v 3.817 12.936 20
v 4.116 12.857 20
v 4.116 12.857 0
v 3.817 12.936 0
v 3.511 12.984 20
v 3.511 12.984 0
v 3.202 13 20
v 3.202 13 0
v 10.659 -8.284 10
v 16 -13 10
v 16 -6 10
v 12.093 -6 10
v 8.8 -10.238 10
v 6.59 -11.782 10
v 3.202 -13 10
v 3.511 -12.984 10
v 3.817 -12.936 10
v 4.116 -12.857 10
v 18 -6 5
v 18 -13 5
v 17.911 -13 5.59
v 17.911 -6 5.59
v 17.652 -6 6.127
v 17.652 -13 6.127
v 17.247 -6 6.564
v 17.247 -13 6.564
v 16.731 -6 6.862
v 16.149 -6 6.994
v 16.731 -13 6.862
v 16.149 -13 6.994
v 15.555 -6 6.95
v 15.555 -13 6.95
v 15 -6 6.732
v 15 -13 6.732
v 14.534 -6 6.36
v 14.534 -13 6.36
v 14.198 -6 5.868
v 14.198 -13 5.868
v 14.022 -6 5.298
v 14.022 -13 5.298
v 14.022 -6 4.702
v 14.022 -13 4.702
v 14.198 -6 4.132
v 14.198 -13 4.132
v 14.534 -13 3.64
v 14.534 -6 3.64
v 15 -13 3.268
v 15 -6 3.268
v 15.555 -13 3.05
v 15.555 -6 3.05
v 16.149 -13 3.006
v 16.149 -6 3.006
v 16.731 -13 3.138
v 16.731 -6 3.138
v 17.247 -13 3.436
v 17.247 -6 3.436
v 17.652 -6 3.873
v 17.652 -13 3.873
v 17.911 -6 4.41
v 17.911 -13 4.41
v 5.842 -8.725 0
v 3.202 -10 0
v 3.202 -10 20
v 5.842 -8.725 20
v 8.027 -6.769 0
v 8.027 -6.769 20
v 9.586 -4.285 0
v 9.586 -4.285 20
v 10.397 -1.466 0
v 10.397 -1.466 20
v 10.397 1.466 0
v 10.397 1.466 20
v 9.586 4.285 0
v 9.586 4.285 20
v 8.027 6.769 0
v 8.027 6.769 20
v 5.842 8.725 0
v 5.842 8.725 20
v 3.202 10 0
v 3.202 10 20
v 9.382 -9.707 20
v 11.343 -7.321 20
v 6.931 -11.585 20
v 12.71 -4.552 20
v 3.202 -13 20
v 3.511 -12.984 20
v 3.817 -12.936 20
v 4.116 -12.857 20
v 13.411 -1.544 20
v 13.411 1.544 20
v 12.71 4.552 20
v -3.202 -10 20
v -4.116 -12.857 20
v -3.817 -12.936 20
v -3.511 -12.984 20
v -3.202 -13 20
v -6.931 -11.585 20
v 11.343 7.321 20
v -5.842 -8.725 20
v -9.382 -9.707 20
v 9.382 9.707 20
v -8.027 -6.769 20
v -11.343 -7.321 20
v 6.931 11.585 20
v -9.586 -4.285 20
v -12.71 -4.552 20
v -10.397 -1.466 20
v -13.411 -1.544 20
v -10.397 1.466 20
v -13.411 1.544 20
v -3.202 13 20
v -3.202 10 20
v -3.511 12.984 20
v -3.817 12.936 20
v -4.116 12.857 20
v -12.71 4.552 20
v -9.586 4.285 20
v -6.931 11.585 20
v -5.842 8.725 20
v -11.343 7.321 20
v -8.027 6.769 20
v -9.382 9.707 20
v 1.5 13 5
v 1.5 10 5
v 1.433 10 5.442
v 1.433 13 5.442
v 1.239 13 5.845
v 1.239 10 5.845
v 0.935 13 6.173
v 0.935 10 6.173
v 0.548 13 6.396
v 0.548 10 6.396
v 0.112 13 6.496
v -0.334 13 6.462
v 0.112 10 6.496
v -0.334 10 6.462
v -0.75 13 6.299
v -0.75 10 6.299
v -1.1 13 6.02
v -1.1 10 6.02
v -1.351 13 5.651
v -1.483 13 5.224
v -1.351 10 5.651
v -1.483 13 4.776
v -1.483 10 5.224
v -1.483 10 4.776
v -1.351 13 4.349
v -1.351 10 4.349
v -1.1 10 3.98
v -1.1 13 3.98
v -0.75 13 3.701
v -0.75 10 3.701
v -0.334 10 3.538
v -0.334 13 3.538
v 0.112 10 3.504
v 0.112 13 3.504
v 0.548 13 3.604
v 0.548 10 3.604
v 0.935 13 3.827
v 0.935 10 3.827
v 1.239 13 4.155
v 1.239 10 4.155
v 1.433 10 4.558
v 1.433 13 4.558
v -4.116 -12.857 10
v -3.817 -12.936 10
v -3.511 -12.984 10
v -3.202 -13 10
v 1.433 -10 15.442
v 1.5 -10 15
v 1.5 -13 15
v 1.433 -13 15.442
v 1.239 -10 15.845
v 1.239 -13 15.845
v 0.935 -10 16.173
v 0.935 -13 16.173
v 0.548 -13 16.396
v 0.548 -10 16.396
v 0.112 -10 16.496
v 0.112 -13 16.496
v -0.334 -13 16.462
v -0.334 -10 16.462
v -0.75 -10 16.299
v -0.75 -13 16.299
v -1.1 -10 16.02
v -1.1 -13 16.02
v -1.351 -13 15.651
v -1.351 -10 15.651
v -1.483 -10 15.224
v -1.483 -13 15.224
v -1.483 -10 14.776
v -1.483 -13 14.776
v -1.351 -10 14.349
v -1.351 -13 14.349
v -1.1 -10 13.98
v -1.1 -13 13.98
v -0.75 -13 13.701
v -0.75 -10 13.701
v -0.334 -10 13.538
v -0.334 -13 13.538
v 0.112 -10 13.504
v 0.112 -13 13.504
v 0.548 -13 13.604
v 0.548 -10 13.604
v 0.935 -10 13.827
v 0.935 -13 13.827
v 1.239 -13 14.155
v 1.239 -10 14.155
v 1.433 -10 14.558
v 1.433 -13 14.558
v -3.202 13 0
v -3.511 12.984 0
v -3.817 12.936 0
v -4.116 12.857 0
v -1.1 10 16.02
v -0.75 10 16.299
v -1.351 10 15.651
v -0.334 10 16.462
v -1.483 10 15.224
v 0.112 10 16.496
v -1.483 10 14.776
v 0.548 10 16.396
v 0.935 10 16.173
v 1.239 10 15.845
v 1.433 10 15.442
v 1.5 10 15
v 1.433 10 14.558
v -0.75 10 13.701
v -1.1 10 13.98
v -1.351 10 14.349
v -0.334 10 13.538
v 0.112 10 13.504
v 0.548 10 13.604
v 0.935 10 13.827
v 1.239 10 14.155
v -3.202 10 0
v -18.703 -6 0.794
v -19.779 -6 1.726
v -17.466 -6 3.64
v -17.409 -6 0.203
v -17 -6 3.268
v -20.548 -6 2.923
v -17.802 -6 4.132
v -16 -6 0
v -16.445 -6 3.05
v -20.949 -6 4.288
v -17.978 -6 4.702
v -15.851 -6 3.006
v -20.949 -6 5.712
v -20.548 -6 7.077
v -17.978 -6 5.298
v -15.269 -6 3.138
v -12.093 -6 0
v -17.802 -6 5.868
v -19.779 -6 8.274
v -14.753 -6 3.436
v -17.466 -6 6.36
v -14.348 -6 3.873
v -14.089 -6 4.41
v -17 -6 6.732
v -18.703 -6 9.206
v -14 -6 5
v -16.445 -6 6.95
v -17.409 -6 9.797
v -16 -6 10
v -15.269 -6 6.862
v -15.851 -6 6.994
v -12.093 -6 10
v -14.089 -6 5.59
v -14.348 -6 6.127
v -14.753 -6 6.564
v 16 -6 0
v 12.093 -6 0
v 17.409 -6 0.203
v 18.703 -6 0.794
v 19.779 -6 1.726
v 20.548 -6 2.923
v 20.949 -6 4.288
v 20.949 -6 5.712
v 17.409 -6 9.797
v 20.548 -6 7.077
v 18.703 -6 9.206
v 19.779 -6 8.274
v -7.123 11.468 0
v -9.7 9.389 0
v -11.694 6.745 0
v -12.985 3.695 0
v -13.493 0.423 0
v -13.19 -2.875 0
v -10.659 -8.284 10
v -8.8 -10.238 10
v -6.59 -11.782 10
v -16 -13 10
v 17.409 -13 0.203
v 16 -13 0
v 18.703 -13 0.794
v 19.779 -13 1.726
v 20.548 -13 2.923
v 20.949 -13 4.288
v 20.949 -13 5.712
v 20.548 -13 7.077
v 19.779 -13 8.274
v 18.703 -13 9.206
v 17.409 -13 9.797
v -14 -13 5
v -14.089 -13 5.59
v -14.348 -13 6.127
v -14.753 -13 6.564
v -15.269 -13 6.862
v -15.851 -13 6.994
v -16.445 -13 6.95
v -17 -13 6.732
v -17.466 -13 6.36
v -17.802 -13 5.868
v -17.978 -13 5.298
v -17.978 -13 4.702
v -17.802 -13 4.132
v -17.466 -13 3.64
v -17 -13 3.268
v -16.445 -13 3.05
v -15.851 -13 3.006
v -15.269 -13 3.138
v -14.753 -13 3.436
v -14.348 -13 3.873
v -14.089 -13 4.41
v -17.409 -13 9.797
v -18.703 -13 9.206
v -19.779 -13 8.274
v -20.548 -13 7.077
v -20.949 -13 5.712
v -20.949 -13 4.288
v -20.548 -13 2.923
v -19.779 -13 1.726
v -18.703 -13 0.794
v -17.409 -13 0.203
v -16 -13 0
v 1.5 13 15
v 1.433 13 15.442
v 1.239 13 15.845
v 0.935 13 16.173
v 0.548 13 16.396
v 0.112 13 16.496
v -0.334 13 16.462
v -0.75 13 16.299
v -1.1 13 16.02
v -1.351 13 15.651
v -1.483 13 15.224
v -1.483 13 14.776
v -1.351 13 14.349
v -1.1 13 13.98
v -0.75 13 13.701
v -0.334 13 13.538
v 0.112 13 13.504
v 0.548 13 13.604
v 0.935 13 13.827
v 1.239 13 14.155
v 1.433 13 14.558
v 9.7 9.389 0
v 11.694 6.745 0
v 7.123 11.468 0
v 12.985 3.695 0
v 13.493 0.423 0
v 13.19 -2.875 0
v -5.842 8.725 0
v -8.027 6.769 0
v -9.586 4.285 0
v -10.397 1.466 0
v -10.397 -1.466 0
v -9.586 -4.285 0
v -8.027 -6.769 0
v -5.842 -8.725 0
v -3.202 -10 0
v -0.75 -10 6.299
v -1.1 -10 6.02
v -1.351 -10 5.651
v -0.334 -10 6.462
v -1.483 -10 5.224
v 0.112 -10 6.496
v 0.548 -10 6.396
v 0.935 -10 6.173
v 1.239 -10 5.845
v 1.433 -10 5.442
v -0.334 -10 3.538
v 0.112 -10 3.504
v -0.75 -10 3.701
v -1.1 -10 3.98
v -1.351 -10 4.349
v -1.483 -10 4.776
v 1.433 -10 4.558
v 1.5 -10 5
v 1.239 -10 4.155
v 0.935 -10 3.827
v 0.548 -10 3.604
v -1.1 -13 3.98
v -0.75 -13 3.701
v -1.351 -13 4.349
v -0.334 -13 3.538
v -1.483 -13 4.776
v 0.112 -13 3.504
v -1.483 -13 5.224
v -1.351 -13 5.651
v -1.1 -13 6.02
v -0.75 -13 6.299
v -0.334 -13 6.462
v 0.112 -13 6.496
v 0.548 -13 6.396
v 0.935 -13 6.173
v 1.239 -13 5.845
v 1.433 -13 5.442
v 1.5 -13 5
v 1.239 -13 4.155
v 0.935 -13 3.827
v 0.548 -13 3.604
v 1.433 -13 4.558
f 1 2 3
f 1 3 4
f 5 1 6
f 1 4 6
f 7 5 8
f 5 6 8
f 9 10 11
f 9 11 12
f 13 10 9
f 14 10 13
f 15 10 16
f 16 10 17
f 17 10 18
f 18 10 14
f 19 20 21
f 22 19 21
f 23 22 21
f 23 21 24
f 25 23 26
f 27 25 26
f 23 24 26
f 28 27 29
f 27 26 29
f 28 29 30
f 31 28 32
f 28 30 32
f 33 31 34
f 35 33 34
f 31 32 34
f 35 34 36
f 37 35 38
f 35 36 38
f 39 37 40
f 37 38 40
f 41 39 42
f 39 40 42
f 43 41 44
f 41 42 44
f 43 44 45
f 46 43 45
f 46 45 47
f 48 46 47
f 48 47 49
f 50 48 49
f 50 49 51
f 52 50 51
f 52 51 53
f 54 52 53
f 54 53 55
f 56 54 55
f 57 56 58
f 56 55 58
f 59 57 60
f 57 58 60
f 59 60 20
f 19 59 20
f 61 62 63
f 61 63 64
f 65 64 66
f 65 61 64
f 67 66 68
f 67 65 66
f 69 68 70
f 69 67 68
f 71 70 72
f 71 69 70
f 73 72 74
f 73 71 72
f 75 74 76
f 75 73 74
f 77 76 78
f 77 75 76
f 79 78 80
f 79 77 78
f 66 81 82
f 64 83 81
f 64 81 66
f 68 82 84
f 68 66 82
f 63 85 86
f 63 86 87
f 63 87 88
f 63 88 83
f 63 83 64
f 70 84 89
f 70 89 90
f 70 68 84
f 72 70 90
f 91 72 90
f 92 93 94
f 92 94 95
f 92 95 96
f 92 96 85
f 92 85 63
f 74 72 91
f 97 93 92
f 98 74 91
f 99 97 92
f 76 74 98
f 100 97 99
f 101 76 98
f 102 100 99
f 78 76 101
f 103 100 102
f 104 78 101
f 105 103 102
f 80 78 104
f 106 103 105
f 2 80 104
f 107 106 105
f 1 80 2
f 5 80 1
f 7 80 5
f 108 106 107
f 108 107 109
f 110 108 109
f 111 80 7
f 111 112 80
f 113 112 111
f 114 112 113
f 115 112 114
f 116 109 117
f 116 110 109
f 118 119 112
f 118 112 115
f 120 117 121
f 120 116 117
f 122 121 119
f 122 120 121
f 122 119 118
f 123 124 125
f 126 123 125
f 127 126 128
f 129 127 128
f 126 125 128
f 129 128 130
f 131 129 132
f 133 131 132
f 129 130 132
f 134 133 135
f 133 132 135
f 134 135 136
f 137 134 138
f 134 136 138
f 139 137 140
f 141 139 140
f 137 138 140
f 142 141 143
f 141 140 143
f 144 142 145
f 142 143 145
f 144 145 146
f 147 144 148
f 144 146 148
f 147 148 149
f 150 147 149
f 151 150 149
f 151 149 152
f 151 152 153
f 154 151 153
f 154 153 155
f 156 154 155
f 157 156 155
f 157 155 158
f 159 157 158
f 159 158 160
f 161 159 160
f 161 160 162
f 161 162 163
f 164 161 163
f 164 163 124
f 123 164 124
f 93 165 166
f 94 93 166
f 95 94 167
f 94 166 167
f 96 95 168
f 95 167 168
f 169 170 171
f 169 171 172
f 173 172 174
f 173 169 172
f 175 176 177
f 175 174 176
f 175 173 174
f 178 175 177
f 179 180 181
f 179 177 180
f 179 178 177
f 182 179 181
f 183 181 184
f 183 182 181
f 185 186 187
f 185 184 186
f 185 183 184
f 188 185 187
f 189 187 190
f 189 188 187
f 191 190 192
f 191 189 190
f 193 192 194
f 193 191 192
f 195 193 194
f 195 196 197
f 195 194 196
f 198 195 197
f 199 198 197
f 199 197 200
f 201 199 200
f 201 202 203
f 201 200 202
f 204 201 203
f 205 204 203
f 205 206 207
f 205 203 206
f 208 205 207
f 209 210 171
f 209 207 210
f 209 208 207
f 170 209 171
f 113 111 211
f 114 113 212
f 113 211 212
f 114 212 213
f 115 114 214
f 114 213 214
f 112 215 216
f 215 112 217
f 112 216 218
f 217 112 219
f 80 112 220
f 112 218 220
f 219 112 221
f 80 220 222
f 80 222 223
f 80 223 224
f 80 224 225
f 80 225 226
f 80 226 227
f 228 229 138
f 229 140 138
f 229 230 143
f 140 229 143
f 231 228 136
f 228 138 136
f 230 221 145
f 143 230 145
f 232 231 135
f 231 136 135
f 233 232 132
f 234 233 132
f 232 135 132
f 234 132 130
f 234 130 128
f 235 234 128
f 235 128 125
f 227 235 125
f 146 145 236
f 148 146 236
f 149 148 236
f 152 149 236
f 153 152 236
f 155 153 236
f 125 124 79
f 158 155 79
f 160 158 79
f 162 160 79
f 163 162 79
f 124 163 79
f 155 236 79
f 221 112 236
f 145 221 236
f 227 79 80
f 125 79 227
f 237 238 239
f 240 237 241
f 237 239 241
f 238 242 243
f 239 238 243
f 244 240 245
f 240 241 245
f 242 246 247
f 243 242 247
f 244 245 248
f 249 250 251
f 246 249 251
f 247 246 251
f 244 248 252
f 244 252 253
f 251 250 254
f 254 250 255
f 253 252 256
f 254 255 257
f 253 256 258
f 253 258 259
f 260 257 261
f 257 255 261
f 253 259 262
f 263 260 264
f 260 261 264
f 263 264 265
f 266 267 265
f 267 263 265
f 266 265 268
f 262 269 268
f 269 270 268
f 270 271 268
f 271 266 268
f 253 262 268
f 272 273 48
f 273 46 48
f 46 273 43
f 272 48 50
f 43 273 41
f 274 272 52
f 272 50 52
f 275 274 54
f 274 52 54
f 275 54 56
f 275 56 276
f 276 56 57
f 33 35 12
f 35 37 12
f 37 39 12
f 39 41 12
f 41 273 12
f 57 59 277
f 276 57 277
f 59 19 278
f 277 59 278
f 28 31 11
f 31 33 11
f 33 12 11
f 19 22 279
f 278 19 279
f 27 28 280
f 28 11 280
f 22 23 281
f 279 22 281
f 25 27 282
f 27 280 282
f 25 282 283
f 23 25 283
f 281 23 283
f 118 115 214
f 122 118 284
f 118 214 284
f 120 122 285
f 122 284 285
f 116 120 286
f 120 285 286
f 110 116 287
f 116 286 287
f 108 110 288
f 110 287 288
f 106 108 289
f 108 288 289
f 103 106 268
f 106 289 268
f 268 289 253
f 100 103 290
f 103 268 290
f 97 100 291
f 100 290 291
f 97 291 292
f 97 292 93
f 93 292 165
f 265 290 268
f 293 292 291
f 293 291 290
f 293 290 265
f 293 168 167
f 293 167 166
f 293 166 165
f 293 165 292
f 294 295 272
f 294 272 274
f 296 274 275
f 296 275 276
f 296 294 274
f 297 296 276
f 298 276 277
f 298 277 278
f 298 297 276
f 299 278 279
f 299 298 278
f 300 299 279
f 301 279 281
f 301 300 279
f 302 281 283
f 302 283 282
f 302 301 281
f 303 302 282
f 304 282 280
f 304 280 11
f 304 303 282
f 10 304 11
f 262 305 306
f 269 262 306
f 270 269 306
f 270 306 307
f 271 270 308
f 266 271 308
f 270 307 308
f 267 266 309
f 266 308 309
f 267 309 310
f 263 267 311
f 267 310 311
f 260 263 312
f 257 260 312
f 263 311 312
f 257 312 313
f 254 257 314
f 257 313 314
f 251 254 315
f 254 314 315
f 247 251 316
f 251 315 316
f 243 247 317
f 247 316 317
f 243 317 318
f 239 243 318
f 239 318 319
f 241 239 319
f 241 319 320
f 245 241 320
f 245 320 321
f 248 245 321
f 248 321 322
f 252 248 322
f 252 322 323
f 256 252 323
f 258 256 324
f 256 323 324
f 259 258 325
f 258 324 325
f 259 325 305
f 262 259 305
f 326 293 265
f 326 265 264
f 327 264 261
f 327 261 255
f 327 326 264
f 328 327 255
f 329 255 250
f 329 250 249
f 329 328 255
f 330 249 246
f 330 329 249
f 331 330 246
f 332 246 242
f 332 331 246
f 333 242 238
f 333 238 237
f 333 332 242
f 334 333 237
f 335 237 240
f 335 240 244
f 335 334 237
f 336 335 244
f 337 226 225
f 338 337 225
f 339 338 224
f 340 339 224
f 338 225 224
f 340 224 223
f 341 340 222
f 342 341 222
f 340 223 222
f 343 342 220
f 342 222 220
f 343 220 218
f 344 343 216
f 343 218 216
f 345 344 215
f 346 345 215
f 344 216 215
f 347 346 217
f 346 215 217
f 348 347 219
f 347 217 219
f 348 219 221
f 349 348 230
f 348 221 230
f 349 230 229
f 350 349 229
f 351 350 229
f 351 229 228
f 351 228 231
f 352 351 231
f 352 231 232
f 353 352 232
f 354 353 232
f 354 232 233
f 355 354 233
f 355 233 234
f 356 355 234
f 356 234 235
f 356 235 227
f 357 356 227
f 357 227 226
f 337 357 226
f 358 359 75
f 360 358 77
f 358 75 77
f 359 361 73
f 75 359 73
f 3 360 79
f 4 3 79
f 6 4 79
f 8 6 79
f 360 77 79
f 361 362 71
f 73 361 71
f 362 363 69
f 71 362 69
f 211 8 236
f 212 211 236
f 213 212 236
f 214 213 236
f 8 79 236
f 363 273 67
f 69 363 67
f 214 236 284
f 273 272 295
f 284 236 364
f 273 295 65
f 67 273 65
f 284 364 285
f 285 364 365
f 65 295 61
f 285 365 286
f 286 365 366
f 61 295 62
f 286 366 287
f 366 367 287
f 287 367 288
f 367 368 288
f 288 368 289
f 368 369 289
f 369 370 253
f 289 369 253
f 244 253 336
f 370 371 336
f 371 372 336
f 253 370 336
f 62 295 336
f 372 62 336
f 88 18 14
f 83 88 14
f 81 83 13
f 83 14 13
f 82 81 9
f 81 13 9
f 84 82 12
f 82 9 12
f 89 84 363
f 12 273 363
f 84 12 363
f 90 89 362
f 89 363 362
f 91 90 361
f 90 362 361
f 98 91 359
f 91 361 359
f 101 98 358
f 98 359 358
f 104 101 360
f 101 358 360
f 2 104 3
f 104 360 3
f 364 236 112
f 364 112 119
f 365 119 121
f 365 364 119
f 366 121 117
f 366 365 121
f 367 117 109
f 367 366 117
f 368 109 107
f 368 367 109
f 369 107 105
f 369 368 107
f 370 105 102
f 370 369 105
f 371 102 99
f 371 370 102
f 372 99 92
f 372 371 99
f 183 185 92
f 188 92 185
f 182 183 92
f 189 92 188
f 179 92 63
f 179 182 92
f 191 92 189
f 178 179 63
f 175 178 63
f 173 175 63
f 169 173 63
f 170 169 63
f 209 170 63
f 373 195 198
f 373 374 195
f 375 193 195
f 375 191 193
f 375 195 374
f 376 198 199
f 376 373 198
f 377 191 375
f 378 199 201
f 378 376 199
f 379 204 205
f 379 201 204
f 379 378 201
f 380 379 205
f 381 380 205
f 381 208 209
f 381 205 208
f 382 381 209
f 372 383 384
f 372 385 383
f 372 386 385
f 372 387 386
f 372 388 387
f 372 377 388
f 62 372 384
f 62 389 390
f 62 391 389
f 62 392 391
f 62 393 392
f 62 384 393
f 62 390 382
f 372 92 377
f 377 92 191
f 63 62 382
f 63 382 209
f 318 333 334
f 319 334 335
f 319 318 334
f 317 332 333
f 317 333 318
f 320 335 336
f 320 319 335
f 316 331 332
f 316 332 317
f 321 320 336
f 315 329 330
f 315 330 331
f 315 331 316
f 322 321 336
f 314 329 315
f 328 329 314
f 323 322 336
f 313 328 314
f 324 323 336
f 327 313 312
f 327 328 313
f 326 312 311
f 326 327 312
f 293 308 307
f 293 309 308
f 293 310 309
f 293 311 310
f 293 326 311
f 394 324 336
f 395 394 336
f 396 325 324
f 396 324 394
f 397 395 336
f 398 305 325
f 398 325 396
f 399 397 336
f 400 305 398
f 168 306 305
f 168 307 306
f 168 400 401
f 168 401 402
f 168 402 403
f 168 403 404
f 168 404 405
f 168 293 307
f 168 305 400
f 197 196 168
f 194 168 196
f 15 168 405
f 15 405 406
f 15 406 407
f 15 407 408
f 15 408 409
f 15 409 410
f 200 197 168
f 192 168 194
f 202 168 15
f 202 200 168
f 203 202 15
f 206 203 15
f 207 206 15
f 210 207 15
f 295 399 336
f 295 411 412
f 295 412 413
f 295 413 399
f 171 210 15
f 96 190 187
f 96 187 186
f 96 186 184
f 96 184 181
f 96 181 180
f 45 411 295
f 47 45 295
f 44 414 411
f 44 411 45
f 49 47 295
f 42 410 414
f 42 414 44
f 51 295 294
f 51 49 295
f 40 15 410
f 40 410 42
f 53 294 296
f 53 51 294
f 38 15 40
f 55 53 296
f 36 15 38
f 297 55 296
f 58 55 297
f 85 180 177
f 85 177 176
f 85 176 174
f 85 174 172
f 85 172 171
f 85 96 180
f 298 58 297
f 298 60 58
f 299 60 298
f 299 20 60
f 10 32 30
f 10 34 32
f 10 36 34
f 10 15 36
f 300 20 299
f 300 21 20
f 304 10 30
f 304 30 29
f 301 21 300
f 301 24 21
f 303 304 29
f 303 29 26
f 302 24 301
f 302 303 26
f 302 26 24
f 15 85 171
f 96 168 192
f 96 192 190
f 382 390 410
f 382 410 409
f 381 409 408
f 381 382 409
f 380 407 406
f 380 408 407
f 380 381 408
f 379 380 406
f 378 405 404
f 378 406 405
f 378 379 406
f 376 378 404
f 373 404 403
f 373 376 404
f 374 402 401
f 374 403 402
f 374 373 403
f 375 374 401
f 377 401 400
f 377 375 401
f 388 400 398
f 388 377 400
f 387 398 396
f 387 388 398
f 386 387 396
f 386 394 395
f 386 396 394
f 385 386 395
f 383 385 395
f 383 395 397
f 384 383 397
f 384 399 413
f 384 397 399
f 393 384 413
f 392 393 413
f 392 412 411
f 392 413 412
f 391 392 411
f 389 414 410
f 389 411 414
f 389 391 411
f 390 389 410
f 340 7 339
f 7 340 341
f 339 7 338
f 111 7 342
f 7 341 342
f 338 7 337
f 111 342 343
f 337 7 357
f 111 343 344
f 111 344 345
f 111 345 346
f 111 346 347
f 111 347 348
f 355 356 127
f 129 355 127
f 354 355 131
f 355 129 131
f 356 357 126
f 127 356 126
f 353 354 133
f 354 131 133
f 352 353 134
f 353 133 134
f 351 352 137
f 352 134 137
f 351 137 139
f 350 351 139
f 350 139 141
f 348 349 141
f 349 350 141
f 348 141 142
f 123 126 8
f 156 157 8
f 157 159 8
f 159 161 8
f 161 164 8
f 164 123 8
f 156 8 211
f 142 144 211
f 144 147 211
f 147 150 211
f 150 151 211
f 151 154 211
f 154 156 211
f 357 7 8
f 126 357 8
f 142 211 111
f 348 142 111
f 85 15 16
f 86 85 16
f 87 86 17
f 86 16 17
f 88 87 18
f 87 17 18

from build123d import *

# Parameters (mm, degrees)
PAD_DEPTH         = 20
SKETCH003_R       = 2
PAD001_DEPTH      = 7
POCKET001_DEPTH   = 20.001
SKETCH002_R       = 1.5
POCKET_DEPTH      = 13.001
POCKET_DEPTH_BACK = -13.001


with BuildPart() as part:
    # Binder → Pad (new body)
    with BuildSketch(Plane(origin=(0, 0, 0), x_dir=(0, 1, 0), z_dir=(0, 0, 1))):
        with BuildLine():
            ThreePointArc((12.857143, 4.116294), (0, 13.5), (-12.857143, 4.116294))
            ThreePointArc((-12.857143, 4.116294), (-12.964071, 3.664472), (-13, 3.201562))
            Line((-13, 3.201562), (-13, -3.201562))
            ThreePointArc((-13, -3.201562), (-12.964071, -3.664472), (-12.857143, -4.116294))
            ThreePointArc((-12.857143, -4.116294), (0, -13.5), (12.857143, -4.116294))
            ThreePointArc((12.857143, -4.116294), (12.964071, -3.664472), (13, -3.201562))
            Line((13, -3.201562), (13, 3.201562))
            ThreePointArc((13, 3.201562), (12.964071, 3.664472), (12.857143, 4.116294))
        make_face()
    extrude(amount=PAD_DEPTH)

    # Sketch003 (on Face3 of Pad) → Pad001 (join)
    with BuildSketch(Plane.XZ.offset(13)):
        with BuildLine():
            ThreePointArc((16, 0), (21, 5), (16, 10))
            Line((16, 10), (-16, 10))
            ThreePointArc((-16, 10), (-21, 5), (-16, 0))
            Line((16, 0), (-16, 0))
        make_face()
        with Locations((16, 5)):
            Circle(SKETCH003_R, mode=Mode.SUBTRACT)
        with Locations((-16, 5)):
            Circle(SKETCH003_R, mode=Mode.SUBTRACT)
    extrude(amount=-PAD001_DEPTH)

    # Sketch → Pocket001 (cut, through all)
    with BuildSketch(Plane.XY):
        with BuildLine():
            ThreePointArc((-3.201562, 10), (-10.5, 0), (-3.201562, -10))
            Line((-3.201562, -10), (3.201562, -10))
            ThreePointArc((3.201562, -10), (10.5, 0), (3.201562, 10))
            Line((-3.201562, 10), (3.201562, 10))
        make_face()
    extrude(amount=POCKET001_DEPTH, mode=Mode.SUBTRACT)

    # Sketch002 → Pocket (cut, two sides)
    with BuildSketch(Plane.XZ) as pocket_sk:
        with Locations((0, 5)):
            Circle(SKETCH002_R)
        with Locations((0, 15)):
            Circle(SKETCH002_R)
    extrude(amount=-POCKET_DEPTH, mode=Mode.SUBTRACT)
    extrude(pocket_sk.sketch, amount=-POCKET_DEPTH_BACK, mode=Mode.SUBTRACT)


solid = part.part
